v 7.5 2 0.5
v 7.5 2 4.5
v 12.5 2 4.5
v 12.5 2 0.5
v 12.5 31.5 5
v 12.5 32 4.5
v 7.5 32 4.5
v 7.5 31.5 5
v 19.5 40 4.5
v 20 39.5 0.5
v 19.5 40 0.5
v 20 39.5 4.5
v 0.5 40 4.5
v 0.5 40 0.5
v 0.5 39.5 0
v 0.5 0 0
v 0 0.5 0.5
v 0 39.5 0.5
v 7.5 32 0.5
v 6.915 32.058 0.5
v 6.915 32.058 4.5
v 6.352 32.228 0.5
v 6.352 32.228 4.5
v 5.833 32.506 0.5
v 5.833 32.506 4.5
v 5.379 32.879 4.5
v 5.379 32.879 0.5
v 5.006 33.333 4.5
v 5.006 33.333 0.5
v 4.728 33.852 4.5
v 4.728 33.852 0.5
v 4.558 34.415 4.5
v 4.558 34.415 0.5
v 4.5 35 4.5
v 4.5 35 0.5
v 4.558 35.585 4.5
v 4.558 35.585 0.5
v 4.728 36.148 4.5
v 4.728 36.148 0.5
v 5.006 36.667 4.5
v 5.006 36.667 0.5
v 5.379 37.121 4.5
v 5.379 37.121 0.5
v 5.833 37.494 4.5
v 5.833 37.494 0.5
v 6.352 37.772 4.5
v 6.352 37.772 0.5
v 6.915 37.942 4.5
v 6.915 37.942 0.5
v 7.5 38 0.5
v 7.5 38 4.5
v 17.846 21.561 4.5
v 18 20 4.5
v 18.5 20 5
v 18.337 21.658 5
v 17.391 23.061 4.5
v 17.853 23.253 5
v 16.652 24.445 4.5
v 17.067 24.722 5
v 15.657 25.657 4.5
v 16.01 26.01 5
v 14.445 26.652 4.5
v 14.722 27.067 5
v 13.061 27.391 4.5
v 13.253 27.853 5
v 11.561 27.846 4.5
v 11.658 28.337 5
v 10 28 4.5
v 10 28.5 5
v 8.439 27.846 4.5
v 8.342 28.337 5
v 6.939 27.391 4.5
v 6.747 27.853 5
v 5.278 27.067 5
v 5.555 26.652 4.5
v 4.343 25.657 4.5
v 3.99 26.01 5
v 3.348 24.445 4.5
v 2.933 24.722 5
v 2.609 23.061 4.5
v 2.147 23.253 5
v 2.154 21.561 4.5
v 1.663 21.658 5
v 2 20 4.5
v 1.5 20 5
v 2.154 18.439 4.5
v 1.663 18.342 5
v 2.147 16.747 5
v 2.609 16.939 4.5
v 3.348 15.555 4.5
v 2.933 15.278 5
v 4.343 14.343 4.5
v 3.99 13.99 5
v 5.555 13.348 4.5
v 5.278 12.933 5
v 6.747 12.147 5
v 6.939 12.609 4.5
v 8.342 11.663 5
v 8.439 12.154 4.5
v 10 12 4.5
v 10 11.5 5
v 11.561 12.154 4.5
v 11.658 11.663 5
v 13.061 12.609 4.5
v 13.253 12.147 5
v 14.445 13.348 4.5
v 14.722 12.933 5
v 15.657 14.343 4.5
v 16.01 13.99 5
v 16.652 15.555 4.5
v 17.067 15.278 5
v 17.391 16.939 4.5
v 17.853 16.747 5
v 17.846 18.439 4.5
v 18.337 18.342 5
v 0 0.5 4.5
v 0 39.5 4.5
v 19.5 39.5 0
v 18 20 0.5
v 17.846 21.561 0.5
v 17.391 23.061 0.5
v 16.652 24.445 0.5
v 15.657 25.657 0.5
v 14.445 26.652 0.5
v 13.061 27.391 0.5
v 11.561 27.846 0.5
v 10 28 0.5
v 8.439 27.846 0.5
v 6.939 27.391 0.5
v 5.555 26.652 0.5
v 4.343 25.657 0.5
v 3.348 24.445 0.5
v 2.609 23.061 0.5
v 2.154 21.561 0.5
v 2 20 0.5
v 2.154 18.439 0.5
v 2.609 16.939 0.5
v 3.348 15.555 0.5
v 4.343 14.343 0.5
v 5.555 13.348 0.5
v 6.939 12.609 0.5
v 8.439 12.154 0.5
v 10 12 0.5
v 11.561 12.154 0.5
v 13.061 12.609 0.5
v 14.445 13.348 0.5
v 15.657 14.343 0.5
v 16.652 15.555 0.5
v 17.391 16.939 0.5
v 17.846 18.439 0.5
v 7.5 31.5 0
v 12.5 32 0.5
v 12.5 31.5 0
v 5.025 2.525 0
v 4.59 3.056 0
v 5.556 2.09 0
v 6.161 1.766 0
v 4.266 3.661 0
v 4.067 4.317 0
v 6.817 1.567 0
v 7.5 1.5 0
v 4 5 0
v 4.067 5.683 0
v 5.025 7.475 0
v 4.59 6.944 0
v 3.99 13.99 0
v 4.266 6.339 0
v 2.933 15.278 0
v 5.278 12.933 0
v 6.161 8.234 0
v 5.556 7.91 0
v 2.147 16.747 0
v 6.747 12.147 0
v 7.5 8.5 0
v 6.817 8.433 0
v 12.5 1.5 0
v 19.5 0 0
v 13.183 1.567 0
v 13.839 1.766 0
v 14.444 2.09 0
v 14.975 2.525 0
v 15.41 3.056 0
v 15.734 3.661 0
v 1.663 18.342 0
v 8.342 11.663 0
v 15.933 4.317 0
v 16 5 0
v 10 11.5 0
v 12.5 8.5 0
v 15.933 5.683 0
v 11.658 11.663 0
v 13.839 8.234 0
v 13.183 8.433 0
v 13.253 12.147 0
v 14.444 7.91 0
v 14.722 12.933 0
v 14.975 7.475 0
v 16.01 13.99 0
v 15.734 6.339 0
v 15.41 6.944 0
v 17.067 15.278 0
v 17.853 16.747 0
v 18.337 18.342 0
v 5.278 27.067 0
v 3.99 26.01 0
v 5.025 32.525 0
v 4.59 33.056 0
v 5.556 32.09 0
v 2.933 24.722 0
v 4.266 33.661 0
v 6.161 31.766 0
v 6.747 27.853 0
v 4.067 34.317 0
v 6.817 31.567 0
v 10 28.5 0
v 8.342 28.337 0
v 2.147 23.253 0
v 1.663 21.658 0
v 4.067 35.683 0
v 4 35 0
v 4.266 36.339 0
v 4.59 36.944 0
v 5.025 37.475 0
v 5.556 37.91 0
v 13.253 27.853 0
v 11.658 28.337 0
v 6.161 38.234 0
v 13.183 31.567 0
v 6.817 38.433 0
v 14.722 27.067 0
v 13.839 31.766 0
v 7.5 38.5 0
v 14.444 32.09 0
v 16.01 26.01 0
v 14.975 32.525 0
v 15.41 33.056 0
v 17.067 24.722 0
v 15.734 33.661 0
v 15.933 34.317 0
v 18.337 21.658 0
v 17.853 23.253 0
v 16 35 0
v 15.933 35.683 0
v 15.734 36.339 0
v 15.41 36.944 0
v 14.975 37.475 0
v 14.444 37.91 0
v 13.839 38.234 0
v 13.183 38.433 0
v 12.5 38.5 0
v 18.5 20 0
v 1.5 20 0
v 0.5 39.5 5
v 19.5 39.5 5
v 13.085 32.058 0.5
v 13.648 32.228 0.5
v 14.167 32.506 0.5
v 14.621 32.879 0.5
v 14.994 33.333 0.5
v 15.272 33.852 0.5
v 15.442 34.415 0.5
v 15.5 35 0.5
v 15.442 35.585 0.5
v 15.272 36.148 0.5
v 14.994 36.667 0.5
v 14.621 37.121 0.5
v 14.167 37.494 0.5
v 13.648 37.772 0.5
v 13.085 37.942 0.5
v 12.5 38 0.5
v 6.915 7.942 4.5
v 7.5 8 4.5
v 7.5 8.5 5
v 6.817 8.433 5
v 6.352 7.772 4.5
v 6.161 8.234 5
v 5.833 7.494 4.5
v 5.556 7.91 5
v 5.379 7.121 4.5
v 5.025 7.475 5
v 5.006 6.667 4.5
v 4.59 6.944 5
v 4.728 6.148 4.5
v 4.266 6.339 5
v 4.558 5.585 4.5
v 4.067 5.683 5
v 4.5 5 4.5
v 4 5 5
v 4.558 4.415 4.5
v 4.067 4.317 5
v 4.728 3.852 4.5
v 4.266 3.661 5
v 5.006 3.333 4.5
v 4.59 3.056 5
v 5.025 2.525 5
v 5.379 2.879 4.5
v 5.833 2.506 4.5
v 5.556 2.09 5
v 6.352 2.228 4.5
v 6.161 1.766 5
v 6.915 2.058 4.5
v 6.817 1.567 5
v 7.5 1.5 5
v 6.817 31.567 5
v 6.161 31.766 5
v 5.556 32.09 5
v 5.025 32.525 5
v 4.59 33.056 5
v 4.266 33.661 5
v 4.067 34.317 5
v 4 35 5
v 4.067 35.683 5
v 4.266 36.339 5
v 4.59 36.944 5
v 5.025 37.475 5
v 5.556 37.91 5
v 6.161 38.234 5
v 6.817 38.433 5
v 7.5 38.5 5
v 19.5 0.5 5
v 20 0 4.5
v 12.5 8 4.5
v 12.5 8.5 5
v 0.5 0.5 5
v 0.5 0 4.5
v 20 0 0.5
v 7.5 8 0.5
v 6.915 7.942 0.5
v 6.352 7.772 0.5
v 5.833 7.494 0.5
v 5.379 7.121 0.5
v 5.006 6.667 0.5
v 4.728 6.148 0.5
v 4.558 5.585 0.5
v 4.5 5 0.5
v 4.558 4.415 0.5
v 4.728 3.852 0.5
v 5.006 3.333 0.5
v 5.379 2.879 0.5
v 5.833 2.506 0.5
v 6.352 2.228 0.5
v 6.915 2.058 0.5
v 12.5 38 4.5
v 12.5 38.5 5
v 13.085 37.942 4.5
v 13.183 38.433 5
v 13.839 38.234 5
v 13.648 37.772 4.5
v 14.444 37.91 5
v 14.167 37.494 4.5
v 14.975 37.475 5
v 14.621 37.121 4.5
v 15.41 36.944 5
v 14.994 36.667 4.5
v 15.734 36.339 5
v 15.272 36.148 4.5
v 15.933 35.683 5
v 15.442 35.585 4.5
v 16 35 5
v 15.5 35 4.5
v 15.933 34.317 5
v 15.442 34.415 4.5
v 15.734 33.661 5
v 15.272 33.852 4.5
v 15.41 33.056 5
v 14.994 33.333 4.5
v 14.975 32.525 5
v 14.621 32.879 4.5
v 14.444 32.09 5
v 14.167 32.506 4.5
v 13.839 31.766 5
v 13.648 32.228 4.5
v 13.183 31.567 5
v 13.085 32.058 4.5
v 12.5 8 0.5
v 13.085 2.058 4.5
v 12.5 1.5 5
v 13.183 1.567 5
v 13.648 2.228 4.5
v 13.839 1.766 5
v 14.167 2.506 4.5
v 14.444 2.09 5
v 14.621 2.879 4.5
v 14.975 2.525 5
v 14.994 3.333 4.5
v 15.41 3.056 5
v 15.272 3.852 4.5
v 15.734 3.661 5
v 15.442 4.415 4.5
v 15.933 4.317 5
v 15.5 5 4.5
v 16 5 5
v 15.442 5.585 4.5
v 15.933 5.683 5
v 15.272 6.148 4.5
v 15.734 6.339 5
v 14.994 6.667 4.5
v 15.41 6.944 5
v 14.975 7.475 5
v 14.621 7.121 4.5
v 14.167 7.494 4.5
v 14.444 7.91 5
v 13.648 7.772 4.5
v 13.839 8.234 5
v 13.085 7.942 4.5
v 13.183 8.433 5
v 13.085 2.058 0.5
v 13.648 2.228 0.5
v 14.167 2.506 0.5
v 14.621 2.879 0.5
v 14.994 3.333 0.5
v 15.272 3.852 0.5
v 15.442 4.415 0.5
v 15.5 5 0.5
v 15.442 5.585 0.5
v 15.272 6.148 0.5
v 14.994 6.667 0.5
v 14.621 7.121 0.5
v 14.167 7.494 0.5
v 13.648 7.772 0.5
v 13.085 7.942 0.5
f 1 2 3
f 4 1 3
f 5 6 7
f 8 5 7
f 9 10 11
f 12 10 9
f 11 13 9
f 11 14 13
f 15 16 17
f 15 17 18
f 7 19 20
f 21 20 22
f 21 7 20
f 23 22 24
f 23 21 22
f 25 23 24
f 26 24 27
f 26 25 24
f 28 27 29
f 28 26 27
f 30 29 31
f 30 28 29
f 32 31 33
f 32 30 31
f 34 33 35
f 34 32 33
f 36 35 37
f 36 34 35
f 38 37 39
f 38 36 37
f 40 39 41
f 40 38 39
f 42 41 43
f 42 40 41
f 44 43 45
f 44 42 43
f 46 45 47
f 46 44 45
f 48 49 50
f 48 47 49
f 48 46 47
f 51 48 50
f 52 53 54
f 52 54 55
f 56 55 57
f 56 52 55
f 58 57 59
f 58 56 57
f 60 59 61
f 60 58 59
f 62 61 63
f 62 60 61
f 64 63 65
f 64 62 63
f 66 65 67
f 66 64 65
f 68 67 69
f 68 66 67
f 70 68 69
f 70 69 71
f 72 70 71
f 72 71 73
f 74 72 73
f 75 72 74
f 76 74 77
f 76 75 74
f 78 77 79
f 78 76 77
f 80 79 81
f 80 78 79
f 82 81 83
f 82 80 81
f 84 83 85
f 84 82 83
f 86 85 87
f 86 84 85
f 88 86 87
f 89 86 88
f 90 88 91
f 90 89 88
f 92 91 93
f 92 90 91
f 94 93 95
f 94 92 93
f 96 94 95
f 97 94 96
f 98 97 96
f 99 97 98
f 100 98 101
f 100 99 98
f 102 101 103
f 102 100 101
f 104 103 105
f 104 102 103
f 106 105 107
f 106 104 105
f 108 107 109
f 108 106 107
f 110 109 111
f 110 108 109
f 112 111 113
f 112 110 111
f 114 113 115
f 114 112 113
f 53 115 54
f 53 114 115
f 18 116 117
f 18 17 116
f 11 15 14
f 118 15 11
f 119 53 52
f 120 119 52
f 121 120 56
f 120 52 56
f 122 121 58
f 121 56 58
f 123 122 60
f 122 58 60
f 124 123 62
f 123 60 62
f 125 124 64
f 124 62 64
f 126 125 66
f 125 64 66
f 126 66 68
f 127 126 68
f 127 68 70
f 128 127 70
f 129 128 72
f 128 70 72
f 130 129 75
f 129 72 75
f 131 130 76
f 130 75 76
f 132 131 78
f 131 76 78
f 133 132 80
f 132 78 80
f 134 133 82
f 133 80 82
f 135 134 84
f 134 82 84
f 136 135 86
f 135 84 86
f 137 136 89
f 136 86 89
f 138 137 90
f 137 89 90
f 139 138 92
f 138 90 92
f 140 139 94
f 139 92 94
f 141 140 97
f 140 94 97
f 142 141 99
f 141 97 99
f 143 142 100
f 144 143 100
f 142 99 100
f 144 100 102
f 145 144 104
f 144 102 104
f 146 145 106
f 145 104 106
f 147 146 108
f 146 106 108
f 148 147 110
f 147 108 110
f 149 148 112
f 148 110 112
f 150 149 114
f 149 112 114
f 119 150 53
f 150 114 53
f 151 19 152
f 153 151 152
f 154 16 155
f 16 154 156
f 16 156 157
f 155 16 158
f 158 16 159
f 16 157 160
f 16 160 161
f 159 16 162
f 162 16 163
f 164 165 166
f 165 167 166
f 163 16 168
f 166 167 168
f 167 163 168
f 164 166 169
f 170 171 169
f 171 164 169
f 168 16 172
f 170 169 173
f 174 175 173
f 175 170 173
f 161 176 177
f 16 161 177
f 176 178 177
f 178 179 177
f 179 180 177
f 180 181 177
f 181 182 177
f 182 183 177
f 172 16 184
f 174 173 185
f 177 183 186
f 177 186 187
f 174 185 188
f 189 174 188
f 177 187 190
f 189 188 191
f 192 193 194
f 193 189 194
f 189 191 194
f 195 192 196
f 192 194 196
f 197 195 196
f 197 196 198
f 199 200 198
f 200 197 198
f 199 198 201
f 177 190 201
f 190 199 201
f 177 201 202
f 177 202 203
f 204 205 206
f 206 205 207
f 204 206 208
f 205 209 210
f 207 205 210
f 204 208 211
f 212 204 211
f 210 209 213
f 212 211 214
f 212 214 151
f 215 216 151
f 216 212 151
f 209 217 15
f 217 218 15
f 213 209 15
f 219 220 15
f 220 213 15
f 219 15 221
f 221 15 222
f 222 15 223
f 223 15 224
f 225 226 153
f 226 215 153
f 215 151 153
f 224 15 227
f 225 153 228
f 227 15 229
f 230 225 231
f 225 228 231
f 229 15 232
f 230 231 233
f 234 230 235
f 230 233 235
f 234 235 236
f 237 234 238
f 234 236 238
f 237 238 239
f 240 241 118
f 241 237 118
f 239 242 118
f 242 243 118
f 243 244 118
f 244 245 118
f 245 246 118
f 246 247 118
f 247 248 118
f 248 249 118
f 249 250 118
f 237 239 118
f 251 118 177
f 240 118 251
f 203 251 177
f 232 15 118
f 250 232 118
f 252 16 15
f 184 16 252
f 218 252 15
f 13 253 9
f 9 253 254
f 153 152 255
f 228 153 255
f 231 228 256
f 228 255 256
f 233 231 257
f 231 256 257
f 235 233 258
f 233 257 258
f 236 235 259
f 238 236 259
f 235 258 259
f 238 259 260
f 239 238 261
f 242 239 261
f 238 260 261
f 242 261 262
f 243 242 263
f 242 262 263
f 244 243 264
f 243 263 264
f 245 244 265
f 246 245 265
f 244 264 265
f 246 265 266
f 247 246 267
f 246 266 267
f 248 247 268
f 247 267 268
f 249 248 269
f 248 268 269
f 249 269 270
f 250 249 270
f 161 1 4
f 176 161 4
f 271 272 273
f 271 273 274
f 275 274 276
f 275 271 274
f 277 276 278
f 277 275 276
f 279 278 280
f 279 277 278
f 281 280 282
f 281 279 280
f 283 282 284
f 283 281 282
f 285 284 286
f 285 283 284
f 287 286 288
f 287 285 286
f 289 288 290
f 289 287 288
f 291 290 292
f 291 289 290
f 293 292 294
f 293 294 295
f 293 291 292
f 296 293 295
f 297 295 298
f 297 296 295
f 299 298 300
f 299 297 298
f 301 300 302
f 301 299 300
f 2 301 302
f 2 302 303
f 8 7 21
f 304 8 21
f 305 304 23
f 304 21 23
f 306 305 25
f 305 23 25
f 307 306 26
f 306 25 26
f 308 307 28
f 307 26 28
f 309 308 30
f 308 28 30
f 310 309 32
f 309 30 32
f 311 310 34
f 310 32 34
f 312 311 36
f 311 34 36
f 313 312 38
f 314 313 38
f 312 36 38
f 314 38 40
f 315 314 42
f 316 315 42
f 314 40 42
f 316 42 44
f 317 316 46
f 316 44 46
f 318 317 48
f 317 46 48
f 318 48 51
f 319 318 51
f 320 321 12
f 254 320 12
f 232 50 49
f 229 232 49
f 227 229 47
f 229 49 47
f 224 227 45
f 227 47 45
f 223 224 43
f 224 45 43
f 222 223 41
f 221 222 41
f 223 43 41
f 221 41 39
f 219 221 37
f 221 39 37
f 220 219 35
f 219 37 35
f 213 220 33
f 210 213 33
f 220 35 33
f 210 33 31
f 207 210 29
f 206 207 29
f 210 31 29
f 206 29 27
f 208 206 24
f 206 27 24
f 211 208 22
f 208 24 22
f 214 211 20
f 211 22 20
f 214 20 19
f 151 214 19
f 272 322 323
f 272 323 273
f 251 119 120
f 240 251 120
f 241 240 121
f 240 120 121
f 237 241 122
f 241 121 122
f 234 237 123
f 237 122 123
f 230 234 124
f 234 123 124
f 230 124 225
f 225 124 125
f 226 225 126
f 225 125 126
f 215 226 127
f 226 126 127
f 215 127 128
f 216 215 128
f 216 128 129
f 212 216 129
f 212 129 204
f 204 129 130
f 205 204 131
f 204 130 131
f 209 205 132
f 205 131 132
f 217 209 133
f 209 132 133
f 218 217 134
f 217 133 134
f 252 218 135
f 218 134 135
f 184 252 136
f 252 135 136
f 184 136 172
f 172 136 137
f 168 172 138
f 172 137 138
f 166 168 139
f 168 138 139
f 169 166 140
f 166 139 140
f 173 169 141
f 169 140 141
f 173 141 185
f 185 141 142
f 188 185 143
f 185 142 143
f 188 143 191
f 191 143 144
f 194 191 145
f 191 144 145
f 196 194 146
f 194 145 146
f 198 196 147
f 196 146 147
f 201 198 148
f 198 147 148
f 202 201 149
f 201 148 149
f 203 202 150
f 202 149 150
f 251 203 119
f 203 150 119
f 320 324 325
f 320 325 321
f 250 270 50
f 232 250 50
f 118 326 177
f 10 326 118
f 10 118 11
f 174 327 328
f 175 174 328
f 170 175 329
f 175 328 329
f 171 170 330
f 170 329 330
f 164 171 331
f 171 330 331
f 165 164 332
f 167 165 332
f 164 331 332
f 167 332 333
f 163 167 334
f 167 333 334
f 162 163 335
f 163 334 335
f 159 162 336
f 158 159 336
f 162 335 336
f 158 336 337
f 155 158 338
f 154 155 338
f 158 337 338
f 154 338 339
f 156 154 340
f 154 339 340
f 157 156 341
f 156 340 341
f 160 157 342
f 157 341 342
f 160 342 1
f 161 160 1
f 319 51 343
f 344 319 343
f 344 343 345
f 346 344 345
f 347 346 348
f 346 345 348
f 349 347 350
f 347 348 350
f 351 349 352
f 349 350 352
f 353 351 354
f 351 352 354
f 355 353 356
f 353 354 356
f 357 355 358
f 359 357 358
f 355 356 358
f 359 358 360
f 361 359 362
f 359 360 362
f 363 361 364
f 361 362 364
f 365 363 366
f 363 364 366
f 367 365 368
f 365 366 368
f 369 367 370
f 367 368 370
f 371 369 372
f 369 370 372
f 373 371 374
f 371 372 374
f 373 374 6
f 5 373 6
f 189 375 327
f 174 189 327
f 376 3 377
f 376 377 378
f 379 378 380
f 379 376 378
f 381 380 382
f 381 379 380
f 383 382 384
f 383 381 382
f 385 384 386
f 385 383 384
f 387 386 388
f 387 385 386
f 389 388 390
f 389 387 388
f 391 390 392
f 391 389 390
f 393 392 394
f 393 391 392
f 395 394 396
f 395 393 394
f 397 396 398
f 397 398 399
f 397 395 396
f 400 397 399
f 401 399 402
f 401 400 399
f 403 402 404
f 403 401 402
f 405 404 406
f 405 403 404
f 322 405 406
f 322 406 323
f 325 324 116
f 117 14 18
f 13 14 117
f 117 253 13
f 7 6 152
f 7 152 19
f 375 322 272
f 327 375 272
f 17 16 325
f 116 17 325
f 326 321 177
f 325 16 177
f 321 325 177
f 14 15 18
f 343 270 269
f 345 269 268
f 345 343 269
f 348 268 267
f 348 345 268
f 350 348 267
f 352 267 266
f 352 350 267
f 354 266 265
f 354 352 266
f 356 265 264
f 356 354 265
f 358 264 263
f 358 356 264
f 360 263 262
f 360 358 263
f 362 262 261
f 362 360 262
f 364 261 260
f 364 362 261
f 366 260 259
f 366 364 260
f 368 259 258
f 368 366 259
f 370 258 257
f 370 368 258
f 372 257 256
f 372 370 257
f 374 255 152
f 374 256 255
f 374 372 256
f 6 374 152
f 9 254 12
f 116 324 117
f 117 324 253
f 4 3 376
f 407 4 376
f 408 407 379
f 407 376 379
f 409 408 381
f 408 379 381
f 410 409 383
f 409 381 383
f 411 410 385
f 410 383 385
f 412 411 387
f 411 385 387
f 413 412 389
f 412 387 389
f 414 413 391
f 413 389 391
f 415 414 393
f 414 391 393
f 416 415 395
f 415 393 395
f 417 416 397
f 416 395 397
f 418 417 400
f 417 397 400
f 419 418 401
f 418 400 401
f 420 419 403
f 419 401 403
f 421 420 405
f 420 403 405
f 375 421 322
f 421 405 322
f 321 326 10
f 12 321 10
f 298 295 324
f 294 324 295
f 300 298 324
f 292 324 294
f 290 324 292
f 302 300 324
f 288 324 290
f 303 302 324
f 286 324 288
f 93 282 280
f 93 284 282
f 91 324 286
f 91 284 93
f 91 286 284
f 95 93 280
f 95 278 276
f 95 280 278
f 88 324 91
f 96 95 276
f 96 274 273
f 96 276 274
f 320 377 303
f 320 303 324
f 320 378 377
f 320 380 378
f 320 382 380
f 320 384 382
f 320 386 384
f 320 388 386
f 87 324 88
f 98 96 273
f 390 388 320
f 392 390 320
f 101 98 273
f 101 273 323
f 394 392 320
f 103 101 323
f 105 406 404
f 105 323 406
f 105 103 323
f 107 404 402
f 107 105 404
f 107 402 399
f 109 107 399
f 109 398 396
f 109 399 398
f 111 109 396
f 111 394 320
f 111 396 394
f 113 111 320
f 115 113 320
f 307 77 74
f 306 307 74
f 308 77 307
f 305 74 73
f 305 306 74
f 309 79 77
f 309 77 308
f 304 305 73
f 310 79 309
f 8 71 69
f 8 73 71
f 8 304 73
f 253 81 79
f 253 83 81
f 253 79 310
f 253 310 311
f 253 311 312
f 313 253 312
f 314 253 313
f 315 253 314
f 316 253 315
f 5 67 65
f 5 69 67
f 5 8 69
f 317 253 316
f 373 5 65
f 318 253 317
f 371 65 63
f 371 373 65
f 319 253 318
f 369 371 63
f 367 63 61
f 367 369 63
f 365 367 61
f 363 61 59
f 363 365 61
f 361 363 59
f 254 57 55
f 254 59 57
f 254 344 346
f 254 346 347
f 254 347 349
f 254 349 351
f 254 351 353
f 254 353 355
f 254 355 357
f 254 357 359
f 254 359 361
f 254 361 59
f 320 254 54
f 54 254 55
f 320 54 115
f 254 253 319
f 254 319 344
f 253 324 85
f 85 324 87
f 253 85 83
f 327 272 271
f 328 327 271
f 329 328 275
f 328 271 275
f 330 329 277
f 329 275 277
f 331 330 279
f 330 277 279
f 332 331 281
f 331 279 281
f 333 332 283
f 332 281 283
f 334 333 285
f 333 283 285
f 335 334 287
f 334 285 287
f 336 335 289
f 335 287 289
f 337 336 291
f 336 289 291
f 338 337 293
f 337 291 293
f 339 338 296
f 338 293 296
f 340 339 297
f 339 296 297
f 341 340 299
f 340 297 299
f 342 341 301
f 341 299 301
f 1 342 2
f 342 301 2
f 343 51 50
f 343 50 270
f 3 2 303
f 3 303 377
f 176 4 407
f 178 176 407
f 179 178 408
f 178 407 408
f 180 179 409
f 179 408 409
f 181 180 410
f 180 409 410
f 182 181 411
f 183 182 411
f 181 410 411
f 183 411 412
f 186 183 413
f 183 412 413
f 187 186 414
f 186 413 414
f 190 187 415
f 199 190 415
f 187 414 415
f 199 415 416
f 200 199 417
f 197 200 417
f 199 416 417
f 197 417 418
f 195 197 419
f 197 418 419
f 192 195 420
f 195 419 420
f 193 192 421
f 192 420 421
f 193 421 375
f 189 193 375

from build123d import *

# Parameters (mm, degrees)
ESQUISSE1_W             = 20
ESQUISSE1_H             = 40
BOSS_EXTRU_1_DEPTH      = 5
ESQUISSE5_R             = 8
ENL_V_MAT_EXTRU_2_DEPTH = 5
ENL_V_MAT_EXTRU_3_DEPTH = 46
CHANFREIN1_SIZE         = 0.5


with BuildPart() as part:
    # Esquisse1 → Boss.-Extru.1 (new body)
    with BuildSketch(Plane.XY):
        with Locations((10, 20)):
            Rectangle(ESQUISSE1_W, ESQUISSE1_H)
    extrude(amount=BOSS_EXTRU_1_DEPTH)

    # Esquisse5 → Enlèv. mat.-Extru.2 (cut)
    with BuildSketch(Plane.XY.offset(5)):
        with Locations((10, 20)):
            Circle(ESQUISSE5_R)
    extrude(amount=-ENL_V_MAT_EXTRU_2_DEPTH, mode=Mode.SUBTRACT)

    # Esquisse6 → Enlèv. mat.-Extru.3 (cut, through all)
    with BuildSketch(Plane.XY.offset(5)):
        with BuildLine():
            Line((7.5, 38), (12.5, 38))
            ThreePointArc((12.5, 38), (15.5, 35), (12.5, 32))
            Line((12.5, 32), (7.5, 32))
            ThreePointArc((7.5, 32), (4.5, 35), (7.5, 38))
        make_face()
        with BuildLine():
            Line((7.5, 2), (12.5, 2))
            ThreePointArc((12.5, 2), (15.5, 5), (12.5, 8))
            Line((12.5, 8), (7.5, 8))
            ThreePointArc((7.5, 8), (4.5, 5), (7.5, 2))
        make_face()
    extrude(amount=-ENL_V_MAT_EXTRU_3_DEPTH, mode=Mode.SUBTRACT)

    # Chanfrein1
    chanfrein1_edges = [part.edges().sort_by_distance(p)[0] for p in [
        (20, 20, 5),
        (10, 40, 5),
        (2, 20, 0),
        (2, 20, 5),
        (4.5, 35, 0),
        (10, 38, 0),
        (15.5, 35, 0),
        (10, 32, 0),
        (4.5, 35, 5),
        (10, 32, 5),
        (15.5, 35, 5),
        (10, 38, 5),
        (4.5, 5, 0),
        (10, 8, 0),
        (15.5, 5, 0),
        (10, 2, 0),
        (4.5, 5, 5),
        (10, 2, 5),
        (15.5, 5, 5),
        (10, 8, 5),
        (0, 20, 5),
        (10, 40, 0),
        (20, 20, 0),
        (0, 20, 0),
        (10, 0, 5),
        (0, 40, 2.5),
        (20, 40, 2.5),
        (0, 0, 2.5),
    ]]
    chamfer(chanfrein1_edges, length=CHANFREIN1_SIZE)


solid = part.part
